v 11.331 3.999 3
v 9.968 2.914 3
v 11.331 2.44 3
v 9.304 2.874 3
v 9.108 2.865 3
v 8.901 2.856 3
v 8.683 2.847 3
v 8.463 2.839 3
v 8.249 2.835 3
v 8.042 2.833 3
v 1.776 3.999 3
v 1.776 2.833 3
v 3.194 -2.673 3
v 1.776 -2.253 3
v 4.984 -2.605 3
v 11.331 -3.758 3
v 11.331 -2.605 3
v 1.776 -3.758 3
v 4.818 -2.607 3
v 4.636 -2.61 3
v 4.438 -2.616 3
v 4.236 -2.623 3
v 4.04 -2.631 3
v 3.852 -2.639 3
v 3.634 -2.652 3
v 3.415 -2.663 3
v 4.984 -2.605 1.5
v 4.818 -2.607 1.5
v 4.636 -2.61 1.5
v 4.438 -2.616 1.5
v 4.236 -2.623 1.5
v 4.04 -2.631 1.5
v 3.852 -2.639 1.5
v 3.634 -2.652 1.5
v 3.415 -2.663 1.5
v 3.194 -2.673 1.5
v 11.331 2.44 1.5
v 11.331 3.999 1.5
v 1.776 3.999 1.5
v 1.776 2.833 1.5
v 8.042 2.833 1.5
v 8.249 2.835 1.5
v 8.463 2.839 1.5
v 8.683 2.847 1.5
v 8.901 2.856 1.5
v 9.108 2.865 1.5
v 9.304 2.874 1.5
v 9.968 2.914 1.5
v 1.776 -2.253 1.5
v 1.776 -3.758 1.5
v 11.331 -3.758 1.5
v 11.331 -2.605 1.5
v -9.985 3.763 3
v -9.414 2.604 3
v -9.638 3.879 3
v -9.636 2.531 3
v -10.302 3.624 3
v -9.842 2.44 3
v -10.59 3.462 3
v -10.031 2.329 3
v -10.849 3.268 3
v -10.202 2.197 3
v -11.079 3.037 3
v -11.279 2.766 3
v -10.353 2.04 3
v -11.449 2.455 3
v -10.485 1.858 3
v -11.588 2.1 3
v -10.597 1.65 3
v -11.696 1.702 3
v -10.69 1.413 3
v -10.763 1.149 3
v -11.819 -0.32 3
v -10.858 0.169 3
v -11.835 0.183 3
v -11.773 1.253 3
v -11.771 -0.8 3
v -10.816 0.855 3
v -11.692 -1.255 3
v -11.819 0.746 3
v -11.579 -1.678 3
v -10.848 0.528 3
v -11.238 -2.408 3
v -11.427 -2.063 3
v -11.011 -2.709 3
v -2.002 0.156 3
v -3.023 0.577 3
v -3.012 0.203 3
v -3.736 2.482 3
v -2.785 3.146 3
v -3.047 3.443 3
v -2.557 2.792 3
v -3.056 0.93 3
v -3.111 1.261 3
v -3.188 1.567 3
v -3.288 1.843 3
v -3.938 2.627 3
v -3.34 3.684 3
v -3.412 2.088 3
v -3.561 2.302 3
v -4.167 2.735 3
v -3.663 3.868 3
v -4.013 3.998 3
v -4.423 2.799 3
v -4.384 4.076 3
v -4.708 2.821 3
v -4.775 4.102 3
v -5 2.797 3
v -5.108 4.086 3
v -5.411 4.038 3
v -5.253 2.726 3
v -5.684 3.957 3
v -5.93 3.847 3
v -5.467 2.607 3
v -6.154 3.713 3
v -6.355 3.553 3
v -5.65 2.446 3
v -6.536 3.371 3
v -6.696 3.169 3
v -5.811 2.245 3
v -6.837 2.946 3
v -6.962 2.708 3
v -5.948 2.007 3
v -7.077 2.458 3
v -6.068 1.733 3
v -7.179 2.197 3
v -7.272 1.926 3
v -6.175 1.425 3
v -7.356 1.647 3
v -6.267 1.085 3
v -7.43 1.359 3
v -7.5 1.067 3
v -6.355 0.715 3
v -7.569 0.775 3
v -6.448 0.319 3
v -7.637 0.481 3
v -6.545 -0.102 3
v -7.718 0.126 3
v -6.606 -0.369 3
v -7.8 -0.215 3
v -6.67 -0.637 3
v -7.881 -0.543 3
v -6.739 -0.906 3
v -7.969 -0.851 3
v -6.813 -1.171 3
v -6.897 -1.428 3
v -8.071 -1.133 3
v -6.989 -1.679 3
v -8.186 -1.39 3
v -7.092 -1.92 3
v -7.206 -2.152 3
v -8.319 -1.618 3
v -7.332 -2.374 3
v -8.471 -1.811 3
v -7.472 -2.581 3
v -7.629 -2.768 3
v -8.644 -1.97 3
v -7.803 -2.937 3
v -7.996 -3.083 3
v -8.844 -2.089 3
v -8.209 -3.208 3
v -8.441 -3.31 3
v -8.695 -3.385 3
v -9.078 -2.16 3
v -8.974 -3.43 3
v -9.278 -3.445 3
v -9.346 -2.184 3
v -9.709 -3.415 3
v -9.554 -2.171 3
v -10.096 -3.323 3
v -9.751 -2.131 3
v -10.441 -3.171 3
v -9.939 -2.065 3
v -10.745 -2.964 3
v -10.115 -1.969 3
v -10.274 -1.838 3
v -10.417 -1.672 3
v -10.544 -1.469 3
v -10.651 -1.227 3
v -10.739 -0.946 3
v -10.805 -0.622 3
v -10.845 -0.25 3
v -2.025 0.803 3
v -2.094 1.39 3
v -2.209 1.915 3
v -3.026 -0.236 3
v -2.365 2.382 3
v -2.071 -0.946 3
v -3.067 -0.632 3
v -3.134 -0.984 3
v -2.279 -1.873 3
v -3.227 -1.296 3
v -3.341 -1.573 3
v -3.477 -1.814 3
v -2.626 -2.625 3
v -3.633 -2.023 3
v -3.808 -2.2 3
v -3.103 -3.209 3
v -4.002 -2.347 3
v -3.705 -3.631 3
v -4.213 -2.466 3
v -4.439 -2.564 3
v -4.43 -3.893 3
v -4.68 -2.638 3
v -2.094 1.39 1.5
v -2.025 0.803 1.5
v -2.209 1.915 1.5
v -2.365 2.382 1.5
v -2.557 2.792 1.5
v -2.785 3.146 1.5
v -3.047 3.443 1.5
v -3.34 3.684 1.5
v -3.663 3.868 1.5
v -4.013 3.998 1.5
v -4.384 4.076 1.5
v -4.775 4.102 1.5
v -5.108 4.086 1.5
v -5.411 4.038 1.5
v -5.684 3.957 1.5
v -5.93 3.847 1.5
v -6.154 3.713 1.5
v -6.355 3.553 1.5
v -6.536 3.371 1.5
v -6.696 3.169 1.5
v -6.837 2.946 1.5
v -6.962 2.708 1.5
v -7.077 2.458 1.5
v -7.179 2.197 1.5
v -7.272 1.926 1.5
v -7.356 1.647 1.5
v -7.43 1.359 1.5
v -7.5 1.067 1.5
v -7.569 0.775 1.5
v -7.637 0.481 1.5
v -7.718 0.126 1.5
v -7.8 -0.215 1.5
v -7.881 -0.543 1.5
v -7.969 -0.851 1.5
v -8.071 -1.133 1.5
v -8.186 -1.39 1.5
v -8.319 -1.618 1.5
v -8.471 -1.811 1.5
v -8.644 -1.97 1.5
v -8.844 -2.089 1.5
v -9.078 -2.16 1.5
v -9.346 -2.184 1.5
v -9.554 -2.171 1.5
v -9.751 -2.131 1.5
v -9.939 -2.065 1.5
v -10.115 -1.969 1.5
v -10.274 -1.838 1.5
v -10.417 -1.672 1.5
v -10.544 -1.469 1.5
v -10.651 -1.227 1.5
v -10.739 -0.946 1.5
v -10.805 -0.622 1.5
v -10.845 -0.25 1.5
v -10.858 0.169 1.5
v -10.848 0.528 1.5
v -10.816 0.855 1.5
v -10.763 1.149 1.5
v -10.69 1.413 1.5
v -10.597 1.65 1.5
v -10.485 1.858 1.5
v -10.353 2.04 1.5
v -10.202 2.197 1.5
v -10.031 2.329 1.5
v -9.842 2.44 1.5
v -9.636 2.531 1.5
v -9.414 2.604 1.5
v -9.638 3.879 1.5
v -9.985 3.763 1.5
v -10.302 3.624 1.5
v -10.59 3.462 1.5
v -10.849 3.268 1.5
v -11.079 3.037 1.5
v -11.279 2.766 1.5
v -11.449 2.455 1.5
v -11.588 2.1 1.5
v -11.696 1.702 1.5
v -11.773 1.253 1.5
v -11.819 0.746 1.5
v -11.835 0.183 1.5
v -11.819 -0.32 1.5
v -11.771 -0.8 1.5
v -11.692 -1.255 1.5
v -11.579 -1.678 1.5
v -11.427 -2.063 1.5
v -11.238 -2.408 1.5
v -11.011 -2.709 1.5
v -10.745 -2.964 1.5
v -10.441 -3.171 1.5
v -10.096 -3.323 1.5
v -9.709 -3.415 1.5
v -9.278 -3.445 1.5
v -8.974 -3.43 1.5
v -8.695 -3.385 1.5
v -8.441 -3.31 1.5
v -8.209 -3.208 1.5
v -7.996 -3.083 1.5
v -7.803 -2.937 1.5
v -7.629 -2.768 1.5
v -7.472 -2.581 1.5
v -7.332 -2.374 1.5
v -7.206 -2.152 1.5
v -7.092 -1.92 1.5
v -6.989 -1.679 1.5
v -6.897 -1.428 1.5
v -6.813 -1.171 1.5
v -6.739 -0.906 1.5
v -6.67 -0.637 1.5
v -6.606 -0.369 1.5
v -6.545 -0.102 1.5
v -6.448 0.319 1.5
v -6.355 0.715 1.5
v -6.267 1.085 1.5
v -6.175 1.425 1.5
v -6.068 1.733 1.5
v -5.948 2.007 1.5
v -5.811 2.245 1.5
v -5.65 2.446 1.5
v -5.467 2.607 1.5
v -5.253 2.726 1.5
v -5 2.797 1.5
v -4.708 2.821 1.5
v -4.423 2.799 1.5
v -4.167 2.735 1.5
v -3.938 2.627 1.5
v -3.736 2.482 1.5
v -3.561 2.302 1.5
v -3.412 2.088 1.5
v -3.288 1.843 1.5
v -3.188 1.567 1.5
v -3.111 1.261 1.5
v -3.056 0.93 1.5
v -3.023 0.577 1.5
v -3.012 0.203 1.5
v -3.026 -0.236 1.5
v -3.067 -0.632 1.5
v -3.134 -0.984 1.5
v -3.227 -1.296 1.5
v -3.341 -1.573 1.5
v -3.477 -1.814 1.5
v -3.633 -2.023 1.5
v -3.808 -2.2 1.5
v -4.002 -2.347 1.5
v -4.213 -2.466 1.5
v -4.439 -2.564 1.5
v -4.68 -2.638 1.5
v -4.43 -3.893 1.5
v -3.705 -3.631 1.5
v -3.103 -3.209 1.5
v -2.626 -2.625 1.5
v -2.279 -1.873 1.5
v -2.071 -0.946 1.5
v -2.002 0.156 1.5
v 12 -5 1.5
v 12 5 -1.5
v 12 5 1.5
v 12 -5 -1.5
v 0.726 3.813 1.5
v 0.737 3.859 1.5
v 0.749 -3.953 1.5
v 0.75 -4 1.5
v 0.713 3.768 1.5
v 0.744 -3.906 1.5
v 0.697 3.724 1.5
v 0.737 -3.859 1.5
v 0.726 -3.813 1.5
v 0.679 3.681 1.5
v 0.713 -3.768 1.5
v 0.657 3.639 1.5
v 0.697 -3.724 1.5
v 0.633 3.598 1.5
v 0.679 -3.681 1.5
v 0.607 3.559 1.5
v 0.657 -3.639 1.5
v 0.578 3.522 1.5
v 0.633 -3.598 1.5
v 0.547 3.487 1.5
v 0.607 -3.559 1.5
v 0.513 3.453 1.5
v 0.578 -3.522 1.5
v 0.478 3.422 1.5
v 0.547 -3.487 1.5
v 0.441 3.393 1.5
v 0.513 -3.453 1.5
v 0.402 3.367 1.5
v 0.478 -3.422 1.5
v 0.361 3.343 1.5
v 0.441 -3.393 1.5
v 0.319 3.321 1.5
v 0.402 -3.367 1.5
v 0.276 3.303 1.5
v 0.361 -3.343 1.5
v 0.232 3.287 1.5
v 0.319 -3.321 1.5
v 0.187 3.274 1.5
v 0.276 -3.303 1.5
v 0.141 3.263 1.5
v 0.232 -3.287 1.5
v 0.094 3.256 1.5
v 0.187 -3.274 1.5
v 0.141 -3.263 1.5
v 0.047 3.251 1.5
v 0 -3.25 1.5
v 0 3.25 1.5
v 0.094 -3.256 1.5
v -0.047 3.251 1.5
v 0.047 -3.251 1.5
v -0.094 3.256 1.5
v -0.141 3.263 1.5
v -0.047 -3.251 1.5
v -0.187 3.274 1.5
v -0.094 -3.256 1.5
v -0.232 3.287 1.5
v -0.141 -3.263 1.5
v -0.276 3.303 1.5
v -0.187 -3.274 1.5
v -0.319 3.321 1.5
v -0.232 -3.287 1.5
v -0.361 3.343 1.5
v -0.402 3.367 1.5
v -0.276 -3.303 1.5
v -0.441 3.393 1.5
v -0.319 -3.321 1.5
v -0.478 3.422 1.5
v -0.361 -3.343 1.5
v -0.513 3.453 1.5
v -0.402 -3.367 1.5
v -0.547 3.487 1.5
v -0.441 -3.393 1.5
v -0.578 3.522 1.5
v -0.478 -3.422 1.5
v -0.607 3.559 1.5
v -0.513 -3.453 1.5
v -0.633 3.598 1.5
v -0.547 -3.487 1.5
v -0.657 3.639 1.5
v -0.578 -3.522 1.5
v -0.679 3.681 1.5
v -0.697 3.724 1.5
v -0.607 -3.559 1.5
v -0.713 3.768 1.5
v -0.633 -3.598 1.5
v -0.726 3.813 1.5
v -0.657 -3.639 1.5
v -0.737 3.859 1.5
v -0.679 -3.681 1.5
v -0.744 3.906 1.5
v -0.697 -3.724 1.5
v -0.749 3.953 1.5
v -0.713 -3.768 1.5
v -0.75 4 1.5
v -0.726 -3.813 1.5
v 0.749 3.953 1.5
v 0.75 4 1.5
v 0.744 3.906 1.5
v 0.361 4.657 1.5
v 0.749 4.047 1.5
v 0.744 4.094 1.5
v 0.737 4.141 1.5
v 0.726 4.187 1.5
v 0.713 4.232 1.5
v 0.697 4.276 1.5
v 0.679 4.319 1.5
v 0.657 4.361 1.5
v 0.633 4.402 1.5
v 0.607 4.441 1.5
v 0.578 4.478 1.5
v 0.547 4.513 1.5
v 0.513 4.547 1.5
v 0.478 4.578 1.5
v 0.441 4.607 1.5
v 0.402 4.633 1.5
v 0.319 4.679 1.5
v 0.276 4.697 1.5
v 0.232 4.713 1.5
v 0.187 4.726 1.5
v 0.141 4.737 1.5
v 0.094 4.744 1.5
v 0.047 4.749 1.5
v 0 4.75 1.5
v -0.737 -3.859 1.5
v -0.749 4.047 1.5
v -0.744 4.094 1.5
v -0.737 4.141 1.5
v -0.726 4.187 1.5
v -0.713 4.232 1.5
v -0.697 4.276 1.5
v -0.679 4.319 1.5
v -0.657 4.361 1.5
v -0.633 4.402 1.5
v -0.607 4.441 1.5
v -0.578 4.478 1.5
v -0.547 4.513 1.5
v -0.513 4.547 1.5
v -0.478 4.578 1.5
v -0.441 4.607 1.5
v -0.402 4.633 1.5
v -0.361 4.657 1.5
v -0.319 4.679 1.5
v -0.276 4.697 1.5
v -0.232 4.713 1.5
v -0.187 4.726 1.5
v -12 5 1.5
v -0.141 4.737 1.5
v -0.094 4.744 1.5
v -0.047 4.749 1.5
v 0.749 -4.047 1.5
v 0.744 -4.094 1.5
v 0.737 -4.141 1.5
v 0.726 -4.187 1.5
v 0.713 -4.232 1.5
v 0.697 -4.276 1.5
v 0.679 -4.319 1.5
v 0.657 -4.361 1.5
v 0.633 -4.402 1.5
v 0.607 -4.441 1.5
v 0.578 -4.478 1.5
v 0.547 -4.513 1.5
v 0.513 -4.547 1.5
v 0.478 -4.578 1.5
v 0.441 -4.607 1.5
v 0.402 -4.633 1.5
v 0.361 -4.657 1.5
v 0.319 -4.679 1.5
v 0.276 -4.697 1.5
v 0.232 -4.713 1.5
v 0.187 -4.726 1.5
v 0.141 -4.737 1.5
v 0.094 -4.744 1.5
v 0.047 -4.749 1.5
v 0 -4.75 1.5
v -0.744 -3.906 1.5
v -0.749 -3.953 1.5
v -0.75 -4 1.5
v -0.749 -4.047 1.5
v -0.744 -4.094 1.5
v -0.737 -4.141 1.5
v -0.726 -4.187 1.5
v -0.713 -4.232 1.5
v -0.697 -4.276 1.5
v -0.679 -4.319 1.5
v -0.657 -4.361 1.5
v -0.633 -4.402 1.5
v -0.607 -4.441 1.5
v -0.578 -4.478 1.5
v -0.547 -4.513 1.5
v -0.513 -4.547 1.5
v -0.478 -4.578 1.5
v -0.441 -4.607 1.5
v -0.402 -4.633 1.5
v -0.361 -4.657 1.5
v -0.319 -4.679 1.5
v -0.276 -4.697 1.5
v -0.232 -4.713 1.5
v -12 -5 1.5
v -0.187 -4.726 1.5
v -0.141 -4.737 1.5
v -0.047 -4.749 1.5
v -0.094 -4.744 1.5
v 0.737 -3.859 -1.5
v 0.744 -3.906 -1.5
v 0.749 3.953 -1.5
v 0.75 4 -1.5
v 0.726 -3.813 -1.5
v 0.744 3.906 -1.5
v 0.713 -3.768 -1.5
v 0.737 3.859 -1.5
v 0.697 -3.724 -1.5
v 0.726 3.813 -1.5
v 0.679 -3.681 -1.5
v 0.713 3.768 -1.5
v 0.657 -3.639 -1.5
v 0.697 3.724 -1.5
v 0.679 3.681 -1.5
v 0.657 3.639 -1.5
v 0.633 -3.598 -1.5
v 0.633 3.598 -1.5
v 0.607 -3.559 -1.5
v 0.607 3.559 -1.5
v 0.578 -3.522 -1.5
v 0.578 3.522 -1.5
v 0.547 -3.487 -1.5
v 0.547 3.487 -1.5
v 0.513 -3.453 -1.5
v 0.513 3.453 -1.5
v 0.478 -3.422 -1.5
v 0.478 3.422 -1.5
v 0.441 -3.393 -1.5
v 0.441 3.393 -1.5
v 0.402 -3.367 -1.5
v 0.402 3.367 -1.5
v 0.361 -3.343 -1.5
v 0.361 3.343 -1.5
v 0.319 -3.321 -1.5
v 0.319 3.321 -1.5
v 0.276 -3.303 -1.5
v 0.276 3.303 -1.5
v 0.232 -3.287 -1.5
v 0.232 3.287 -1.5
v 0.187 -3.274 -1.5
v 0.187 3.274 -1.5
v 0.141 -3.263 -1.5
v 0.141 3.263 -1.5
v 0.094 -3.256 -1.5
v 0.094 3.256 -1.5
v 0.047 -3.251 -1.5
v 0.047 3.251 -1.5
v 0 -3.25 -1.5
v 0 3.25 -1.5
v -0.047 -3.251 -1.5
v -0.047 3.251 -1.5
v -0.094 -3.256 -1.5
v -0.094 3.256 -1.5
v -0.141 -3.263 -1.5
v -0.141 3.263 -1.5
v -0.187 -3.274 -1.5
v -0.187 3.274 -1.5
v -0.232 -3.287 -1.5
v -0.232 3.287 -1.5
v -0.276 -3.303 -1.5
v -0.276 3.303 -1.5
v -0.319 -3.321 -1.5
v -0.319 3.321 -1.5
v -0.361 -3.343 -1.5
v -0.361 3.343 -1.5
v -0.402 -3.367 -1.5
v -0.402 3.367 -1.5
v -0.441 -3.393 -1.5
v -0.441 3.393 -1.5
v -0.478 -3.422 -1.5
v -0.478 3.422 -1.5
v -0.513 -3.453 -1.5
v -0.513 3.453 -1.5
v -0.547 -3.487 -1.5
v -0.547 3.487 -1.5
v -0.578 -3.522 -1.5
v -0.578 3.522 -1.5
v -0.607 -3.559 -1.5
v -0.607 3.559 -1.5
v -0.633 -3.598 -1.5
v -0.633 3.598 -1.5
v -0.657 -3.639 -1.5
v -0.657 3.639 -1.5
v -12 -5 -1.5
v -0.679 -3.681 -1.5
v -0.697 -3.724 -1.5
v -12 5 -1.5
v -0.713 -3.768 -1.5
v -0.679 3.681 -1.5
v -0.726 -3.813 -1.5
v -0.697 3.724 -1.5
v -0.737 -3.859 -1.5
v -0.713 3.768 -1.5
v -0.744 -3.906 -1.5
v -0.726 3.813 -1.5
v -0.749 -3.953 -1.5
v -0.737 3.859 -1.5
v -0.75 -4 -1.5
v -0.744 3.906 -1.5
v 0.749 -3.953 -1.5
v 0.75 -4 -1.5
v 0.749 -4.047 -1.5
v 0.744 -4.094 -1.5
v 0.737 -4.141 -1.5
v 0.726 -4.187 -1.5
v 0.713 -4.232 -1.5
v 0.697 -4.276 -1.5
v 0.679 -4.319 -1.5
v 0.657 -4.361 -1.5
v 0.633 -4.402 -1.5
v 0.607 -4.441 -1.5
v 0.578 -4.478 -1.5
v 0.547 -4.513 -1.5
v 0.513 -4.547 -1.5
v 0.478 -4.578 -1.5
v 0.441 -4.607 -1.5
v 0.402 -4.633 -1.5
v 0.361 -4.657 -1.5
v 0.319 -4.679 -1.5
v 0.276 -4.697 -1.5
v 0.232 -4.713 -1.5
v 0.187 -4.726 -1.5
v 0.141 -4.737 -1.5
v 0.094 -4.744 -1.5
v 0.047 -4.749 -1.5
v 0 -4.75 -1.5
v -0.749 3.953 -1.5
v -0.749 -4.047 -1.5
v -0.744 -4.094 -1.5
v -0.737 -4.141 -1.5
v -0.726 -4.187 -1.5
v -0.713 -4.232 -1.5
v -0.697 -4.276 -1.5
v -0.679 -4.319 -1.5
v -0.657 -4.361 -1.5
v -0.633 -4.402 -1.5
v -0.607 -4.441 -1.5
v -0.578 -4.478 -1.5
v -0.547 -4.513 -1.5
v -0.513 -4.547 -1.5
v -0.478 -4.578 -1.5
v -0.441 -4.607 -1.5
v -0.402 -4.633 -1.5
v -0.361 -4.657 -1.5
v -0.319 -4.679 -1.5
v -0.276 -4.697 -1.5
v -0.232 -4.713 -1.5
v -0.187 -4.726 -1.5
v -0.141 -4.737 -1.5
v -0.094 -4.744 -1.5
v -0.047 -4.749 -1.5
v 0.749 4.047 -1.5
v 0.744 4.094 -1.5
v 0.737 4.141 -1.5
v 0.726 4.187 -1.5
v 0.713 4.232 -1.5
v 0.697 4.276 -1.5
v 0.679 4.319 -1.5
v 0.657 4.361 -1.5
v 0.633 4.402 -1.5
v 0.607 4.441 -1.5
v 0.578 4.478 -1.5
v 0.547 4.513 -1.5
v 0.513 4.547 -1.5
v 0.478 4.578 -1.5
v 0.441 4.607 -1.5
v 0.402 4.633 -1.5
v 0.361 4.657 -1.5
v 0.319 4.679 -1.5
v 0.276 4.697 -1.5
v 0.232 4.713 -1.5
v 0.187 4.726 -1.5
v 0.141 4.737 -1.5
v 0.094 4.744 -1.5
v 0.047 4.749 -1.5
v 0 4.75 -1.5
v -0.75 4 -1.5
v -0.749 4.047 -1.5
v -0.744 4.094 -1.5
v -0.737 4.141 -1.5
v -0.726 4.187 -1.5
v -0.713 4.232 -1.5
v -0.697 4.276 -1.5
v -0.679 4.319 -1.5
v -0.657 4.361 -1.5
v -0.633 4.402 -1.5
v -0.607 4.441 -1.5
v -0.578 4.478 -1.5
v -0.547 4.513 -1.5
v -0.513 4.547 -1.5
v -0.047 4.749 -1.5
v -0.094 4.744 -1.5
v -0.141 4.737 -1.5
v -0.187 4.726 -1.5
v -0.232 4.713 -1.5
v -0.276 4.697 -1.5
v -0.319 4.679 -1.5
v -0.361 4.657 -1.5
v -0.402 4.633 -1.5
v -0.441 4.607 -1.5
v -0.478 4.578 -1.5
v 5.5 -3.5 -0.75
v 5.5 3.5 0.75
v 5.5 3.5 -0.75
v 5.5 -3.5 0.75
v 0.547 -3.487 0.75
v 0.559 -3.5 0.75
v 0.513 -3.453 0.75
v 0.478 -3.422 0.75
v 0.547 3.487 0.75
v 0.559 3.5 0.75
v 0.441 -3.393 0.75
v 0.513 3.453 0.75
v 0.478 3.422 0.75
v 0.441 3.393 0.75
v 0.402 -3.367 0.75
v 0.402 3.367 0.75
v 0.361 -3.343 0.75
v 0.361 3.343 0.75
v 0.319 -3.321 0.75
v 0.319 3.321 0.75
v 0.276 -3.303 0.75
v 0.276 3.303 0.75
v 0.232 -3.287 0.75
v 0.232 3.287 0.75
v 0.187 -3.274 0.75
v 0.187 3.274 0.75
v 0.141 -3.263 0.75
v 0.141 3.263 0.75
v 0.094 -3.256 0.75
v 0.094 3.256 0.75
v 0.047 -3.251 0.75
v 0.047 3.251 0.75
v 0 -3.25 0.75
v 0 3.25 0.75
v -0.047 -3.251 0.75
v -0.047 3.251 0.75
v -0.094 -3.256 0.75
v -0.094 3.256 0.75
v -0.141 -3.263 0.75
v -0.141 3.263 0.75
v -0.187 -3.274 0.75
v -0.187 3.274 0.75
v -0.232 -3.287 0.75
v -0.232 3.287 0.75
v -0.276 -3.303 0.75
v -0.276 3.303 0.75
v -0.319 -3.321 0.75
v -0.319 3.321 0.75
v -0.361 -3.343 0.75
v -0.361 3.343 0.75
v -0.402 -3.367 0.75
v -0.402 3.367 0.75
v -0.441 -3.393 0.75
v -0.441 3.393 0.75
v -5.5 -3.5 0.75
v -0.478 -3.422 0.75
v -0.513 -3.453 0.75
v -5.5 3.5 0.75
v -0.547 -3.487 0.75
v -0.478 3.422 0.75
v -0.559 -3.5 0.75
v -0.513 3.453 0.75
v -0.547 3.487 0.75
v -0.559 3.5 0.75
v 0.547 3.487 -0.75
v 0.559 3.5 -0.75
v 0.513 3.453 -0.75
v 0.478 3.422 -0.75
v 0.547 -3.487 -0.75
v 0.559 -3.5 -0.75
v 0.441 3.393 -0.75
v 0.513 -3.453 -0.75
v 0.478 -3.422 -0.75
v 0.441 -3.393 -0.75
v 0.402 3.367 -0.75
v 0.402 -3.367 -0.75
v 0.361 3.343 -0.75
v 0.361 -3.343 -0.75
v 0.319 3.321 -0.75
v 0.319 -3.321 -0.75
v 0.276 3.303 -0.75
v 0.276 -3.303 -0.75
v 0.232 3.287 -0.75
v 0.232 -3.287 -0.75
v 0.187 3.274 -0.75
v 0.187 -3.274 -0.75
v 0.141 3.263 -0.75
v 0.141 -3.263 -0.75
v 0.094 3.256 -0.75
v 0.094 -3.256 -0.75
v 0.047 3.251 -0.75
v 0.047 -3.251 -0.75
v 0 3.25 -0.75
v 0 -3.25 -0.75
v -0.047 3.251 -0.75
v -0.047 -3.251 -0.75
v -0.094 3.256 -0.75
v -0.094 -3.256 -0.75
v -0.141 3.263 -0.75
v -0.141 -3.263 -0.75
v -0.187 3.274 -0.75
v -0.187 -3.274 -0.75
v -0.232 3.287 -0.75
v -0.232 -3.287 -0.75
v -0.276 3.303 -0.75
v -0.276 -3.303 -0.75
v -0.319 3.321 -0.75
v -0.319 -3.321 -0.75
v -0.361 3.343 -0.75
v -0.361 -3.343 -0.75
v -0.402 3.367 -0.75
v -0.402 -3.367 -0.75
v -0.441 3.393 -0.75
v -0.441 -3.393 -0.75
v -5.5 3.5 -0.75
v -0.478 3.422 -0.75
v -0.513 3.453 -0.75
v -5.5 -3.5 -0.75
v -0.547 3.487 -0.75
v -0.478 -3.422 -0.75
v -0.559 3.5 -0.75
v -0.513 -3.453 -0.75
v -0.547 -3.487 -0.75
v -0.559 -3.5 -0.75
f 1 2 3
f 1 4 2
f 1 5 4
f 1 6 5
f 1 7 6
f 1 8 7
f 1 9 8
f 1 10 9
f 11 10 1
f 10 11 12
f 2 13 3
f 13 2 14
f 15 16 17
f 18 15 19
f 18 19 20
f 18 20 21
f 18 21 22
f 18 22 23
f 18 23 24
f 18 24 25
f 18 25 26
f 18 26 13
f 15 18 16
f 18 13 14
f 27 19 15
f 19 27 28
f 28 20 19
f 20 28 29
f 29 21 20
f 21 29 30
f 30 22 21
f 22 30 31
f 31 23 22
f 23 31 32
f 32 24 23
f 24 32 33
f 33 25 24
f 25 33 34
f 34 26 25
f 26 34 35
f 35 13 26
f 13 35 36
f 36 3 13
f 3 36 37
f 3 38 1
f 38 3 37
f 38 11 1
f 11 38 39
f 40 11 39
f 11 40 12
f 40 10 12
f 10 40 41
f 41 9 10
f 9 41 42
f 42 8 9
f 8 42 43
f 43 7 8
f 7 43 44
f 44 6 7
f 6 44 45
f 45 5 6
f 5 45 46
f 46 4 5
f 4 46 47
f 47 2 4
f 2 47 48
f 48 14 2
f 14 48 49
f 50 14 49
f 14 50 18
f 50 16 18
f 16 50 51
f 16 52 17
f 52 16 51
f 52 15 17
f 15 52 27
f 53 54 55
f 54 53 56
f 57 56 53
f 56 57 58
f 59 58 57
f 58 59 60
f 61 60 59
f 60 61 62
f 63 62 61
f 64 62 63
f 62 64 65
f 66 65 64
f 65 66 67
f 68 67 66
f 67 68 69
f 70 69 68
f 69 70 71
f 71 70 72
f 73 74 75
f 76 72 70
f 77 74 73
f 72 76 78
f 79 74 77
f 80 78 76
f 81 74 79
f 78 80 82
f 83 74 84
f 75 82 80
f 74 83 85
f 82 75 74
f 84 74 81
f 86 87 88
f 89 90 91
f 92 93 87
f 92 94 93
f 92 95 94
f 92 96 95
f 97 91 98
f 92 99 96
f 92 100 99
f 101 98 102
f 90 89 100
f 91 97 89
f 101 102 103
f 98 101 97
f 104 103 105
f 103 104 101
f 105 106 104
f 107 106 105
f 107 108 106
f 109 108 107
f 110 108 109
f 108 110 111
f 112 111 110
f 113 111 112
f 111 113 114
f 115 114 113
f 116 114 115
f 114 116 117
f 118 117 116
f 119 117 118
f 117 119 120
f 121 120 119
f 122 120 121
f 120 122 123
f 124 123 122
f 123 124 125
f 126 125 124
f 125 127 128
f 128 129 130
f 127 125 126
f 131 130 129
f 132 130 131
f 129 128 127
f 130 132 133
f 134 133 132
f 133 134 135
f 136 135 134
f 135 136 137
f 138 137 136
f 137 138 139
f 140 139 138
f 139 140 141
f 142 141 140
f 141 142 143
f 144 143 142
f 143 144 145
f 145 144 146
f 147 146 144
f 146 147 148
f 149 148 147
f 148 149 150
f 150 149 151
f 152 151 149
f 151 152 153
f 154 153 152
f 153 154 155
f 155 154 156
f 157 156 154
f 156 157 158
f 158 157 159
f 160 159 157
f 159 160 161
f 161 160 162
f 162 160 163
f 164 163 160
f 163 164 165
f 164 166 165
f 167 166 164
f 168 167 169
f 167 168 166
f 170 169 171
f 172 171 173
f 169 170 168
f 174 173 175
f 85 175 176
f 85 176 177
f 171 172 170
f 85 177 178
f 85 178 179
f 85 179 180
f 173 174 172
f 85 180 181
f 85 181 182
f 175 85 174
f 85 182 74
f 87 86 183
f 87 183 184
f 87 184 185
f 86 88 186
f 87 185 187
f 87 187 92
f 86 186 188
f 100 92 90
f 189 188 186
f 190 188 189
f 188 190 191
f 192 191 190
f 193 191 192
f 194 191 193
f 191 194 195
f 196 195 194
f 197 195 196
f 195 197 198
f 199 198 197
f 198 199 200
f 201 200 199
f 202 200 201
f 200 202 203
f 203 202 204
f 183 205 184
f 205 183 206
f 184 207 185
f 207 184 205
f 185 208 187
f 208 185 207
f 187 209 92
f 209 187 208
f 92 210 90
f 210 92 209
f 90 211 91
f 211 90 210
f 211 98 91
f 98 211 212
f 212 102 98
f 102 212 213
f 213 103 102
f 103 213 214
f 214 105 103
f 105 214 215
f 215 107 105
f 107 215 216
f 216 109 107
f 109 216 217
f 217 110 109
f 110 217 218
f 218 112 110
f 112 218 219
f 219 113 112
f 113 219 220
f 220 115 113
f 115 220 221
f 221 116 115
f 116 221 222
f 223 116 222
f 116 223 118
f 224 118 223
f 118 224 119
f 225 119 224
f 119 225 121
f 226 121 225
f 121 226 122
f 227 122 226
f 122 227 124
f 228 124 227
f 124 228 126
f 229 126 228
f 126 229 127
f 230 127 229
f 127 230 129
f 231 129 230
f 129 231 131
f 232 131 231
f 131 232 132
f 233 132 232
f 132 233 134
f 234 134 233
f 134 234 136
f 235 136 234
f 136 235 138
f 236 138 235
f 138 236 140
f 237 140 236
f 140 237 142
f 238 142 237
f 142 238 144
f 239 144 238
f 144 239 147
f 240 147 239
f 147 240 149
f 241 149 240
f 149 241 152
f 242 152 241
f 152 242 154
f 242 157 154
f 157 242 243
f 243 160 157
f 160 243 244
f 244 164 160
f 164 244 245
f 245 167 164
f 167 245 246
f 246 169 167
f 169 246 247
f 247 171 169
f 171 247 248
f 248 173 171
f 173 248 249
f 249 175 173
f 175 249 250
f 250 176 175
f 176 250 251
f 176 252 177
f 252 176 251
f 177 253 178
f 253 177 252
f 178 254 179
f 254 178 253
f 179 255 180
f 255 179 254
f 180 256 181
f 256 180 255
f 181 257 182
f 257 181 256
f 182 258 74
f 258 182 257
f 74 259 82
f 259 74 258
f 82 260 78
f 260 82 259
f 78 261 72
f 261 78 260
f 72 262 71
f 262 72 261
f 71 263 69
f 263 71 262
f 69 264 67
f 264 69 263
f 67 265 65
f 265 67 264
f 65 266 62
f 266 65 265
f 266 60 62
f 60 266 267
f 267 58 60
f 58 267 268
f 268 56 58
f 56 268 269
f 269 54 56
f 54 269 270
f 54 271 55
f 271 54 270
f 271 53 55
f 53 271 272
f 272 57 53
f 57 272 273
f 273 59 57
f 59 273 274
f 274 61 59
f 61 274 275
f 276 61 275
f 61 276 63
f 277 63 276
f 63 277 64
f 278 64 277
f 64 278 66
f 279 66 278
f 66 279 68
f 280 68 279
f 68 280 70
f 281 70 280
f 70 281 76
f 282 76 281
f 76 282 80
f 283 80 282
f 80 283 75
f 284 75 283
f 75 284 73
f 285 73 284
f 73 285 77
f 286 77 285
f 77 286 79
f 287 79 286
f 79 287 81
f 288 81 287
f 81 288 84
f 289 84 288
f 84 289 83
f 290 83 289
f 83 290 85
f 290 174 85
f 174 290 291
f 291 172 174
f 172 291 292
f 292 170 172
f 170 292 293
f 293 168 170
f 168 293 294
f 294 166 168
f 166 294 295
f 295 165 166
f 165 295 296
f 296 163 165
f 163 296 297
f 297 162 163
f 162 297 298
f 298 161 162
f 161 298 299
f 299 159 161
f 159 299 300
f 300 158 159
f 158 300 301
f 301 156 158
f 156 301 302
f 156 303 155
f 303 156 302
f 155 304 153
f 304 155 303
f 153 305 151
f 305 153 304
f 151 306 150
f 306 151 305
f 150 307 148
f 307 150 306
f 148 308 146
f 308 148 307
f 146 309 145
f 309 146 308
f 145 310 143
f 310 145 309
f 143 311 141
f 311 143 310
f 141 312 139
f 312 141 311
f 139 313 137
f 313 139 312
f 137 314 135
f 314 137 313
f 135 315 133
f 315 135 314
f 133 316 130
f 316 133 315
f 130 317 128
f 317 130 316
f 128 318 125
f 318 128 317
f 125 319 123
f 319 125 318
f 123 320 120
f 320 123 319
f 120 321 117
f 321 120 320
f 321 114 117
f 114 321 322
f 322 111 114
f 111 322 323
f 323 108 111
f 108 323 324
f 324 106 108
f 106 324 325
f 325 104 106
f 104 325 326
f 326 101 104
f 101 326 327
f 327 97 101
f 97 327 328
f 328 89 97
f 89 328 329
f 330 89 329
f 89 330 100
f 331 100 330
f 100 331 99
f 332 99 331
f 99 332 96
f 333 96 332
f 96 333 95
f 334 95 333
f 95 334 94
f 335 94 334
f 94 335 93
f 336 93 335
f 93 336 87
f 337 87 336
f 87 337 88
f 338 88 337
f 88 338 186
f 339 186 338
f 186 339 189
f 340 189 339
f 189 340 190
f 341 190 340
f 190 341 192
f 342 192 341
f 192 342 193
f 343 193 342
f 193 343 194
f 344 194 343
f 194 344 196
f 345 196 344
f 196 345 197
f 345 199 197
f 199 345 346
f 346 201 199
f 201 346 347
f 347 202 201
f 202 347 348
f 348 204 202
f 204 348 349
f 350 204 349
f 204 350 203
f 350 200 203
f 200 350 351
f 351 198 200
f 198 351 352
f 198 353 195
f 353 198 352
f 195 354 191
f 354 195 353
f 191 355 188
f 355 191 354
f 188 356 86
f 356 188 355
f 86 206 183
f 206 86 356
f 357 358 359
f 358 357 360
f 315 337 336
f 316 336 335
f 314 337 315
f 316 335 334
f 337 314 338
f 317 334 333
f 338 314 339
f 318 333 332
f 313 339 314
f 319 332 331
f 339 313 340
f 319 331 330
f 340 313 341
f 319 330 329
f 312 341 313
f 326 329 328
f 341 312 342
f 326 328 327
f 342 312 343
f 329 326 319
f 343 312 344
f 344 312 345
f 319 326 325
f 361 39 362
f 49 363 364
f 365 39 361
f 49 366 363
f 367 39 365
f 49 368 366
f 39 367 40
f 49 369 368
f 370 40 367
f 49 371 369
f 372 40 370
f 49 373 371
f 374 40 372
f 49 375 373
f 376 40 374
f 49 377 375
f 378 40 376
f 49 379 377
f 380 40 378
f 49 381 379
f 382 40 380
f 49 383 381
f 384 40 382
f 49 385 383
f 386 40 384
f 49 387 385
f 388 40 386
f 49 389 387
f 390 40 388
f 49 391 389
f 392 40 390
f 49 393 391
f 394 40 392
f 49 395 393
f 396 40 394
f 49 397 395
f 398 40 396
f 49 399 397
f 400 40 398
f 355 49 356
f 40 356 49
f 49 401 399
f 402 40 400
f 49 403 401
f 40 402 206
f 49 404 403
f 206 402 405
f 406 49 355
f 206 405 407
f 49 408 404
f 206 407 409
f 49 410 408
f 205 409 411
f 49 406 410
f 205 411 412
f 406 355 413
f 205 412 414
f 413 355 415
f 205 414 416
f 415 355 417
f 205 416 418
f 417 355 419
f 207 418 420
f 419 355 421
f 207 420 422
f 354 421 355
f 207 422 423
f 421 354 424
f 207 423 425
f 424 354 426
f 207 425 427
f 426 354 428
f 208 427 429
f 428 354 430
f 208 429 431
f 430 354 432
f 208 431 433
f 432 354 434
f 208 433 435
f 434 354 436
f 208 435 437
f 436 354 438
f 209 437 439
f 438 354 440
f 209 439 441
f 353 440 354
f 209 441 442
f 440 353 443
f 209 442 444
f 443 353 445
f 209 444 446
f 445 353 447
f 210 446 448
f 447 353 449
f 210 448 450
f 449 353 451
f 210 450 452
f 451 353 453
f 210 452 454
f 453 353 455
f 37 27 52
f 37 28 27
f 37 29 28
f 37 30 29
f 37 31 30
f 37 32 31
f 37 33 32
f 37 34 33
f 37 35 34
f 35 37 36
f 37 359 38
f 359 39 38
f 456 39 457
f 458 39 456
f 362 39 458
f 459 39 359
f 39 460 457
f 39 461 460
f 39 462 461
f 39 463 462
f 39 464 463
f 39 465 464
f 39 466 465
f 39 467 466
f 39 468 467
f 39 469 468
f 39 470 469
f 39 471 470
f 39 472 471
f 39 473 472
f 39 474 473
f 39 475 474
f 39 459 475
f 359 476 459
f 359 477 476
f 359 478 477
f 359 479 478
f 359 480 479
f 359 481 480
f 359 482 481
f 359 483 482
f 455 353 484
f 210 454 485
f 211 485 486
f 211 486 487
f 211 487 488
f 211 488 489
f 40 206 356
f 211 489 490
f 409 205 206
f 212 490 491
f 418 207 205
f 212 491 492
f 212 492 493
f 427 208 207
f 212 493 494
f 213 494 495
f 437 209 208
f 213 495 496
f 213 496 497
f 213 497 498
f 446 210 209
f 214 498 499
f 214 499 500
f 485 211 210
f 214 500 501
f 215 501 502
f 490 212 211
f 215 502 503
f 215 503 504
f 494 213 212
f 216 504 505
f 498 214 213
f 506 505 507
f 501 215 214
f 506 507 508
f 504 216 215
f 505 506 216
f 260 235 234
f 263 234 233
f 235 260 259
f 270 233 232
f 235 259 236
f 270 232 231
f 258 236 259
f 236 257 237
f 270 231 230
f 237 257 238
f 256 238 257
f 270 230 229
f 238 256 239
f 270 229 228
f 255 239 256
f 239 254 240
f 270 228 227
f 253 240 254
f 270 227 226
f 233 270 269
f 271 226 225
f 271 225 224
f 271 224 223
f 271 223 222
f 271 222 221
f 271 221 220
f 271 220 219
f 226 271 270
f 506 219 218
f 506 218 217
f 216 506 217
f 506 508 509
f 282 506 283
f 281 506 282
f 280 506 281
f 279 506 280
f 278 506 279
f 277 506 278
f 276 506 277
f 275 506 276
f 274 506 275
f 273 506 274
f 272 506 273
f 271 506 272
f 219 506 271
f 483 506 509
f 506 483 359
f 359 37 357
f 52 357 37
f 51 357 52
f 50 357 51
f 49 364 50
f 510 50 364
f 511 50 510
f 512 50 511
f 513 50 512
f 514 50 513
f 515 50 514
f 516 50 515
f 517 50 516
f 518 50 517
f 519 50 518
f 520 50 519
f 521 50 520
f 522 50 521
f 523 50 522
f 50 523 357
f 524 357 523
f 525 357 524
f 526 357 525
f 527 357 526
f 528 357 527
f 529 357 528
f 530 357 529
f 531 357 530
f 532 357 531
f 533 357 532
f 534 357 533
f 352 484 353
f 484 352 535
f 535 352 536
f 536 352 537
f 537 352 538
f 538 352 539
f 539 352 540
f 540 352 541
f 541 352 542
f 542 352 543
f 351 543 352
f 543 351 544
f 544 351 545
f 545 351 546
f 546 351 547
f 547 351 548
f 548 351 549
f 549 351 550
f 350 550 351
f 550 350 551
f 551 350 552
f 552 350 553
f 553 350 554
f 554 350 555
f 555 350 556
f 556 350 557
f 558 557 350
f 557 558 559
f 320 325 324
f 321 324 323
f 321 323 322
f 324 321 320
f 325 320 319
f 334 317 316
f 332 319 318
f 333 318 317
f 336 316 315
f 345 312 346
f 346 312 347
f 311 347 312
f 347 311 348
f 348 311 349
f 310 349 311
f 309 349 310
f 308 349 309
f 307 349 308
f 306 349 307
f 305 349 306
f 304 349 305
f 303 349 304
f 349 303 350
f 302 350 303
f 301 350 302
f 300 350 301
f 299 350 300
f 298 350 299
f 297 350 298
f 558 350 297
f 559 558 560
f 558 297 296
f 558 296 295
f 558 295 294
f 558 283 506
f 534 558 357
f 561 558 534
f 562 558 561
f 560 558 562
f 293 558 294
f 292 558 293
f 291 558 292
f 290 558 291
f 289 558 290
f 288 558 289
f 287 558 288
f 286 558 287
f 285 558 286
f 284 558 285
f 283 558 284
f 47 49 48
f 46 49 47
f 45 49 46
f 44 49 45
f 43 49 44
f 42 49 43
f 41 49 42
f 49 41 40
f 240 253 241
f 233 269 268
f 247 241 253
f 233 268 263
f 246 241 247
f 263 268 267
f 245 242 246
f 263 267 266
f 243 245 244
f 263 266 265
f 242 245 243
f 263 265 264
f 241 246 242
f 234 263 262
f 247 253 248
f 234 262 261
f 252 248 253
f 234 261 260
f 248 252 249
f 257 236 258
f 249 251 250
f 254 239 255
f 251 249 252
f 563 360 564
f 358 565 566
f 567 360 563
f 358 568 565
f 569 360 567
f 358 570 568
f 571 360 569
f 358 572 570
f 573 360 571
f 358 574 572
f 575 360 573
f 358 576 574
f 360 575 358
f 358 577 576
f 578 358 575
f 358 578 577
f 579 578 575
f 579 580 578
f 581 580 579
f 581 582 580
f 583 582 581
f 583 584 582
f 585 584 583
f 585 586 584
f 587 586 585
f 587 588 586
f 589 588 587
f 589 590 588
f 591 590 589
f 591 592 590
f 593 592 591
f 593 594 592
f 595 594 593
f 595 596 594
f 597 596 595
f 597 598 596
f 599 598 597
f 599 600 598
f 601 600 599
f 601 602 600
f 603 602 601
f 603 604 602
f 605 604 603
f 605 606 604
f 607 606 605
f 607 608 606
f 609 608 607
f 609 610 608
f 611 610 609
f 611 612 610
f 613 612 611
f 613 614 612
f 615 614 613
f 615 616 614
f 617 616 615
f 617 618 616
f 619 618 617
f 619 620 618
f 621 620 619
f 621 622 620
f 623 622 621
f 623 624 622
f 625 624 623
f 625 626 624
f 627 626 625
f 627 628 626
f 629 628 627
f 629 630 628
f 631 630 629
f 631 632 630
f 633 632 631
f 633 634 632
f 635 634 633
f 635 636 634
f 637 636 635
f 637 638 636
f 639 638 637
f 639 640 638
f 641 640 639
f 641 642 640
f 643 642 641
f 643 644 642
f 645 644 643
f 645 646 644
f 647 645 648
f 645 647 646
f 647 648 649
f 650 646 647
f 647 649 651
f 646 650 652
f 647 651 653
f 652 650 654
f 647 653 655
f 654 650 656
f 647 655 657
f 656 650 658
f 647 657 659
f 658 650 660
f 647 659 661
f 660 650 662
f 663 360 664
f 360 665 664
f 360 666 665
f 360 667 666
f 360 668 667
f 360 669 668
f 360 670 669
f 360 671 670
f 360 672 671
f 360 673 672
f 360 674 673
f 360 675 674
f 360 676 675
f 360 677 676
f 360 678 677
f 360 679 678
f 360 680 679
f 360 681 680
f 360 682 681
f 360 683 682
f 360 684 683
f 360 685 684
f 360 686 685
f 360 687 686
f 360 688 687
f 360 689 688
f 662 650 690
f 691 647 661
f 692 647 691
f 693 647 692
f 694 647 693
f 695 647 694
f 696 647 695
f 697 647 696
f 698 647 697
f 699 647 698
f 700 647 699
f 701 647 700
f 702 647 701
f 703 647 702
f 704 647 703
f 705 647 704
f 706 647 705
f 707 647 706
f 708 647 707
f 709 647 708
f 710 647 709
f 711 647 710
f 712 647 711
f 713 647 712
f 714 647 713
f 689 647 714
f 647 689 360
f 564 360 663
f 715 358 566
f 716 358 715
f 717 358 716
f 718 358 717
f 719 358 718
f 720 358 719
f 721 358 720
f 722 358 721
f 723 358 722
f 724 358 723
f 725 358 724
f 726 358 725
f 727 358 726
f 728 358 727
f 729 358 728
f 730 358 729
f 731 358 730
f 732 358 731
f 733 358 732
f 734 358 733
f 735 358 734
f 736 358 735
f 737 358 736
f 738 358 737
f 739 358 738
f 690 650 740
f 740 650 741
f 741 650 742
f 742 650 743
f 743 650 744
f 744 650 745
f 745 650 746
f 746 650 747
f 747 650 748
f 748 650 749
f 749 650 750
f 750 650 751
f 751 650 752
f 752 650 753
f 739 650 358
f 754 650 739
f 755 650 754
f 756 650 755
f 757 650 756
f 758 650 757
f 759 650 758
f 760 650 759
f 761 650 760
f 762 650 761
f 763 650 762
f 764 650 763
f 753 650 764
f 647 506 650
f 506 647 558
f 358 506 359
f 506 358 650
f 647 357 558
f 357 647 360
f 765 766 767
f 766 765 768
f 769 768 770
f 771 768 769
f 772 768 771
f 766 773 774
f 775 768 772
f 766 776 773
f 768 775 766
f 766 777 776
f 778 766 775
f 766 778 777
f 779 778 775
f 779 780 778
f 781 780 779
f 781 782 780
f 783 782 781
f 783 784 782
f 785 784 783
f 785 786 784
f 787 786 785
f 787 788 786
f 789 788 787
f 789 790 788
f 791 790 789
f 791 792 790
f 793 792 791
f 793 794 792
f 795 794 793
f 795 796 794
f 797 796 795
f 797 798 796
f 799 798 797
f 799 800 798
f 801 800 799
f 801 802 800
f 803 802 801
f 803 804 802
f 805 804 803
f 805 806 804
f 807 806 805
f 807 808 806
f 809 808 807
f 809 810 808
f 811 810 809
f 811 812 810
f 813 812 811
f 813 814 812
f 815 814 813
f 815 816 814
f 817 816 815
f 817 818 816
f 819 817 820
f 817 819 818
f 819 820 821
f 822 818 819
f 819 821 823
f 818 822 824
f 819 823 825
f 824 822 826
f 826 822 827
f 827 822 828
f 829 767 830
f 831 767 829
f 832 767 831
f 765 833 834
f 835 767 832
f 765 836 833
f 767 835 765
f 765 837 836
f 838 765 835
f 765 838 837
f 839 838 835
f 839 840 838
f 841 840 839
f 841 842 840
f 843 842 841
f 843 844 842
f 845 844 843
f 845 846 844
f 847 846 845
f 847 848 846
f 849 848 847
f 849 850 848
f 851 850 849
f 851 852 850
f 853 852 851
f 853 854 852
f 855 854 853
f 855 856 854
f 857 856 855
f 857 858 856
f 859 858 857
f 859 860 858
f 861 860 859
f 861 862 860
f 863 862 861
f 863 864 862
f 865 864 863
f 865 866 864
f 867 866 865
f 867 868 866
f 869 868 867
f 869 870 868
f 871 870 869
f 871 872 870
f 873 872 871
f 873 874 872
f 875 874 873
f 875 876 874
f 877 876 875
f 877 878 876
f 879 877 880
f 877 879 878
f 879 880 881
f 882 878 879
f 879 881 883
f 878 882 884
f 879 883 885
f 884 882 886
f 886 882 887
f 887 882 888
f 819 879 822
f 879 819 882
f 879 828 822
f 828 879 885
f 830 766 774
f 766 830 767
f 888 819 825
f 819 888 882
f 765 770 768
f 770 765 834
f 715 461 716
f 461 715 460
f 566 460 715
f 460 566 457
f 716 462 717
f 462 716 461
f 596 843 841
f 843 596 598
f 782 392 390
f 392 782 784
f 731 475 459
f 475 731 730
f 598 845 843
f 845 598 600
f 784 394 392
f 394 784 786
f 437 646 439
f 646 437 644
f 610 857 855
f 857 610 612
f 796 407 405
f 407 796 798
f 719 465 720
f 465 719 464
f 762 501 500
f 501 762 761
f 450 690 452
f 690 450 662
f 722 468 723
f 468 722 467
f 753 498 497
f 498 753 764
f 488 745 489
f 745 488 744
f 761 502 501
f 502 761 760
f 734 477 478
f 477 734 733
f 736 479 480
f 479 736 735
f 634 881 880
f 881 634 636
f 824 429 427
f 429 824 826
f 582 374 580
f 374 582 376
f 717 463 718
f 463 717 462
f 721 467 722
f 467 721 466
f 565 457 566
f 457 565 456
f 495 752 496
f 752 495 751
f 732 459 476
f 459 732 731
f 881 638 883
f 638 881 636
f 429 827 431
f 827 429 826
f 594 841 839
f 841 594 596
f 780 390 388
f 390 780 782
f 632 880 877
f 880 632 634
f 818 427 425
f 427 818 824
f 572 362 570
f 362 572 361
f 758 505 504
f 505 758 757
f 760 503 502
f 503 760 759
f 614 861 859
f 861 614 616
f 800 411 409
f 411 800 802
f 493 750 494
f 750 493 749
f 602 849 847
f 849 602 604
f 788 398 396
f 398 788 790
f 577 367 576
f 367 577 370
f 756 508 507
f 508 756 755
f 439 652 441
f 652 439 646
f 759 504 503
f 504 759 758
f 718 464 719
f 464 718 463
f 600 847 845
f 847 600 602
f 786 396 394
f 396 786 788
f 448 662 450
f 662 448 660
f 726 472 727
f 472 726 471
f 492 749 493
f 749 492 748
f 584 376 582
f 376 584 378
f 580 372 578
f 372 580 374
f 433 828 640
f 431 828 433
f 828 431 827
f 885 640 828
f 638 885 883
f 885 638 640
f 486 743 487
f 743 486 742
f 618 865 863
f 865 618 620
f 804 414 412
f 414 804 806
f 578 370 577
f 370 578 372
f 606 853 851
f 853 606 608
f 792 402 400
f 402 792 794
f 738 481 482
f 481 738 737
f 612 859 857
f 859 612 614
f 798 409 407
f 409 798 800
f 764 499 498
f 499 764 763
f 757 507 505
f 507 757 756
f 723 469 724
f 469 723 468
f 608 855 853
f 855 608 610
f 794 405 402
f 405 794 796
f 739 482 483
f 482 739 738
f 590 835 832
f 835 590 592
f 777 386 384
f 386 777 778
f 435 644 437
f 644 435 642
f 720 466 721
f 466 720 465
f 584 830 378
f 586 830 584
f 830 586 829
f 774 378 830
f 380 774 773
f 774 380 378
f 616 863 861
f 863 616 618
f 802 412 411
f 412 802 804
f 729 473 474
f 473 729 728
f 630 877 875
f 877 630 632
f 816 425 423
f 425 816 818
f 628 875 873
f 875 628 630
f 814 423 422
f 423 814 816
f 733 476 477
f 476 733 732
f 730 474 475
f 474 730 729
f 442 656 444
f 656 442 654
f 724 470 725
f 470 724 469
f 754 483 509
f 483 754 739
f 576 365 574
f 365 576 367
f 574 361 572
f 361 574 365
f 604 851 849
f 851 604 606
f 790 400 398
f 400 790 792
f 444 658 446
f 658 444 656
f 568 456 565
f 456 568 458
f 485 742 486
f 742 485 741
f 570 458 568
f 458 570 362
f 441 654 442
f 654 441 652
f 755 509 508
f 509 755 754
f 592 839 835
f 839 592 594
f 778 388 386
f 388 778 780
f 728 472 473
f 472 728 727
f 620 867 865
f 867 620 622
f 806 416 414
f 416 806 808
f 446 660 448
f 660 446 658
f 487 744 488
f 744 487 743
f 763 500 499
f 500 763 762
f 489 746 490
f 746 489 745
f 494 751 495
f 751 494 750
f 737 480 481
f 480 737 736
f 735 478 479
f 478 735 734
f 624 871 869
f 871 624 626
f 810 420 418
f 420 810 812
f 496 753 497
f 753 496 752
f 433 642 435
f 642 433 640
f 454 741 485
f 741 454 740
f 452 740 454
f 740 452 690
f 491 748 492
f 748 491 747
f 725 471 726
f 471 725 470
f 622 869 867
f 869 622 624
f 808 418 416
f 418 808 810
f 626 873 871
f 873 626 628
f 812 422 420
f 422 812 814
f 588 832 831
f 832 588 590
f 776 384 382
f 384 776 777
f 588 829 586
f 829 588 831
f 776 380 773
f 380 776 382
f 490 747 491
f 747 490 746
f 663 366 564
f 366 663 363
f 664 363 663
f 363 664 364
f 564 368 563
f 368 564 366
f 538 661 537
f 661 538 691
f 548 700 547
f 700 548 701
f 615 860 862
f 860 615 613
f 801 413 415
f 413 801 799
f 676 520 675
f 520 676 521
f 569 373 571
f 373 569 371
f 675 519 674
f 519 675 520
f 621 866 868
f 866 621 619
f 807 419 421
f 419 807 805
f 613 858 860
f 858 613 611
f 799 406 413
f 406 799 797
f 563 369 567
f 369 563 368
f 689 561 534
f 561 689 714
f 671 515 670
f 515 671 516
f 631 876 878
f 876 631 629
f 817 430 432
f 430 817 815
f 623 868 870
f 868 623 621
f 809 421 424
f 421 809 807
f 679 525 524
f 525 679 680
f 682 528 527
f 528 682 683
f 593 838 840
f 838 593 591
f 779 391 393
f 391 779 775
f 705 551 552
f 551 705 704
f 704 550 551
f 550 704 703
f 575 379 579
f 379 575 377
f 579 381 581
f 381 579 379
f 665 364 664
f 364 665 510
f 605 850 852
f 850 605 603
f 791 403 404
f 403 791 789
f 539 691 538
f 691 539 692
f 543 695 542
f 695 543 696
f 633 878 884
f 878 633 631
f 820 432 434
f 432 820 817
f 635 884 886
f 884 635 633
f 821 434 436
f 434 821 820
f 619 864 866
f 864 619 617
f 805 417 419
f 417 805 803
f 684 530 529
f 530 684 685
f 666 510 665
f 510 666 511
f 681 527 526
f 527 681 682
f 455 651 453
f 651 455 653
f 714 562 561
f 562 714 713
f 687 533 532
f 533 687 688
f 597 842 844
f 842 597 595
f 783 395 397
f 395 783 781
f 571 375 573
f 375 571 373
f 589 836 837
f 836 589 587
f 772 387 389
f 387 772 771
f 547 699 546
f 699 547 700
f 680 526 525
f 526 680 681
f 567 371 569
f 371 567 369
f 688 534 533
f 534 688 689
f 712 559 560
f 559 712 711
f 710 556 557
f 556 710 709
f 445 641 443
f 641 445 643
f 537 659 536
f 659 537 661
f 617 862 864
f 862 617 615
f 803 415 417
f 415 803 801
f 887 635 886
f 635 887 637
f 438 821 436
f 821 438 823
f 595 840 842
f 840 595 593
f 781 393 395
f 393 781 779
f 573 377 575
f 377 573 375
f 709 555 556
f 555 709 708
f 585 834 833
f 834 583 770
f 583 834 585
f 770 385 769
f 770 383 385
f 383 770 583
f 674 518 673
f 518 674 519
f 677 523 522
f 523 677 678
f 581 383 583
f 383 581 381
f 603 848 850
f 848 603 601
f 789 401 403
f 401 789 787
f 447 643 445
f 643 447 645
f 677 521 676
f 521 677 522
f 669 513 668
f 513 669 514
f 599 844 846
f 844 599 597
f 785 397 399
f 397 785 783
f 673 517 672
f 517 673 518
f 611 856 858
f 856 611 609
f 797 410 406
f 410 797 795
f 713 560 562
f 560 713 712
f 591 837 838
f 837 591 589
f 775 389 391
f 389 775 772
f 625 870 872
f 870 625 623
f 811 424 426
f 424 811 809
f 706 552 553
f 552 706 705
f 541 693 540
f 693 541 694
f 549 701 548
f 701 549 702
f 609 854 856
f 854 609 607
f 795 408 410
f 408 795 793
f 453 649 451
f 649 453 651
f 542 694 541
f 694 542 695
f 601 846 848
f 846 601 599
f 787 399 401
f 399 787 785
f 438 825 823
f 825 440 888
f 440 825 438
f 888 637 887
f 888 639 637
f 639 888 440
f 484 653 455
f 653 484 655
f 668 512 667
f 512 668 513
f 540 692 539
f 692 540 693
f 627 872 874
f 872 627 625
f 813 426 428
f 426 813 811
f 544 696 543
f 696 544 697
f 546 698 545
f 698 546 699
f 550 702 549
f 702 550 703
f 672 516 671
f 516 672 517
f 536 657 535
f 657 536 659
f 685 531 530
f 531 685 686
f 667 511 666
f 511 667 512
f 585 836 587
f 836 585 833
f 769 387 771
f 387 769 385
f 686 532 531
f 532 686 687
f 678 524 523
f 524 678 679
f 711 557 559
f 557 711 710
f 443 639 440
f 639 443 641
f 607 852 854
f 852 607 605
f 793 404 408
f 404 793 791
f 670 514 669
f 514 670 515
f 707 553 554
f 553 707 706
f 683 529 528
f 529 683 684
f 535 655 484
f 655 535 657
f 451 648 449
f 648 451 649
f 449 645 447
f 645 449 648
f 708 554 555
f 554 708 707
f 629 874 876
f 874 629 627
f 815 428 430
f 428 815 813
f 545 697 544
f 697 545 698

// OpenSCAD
difference()
{
    union()
    {
        translate([2,0,0]) linear_extrude(height = 3) rotate([0,0,90])
            text("N", size = 10, h =10, $fn = 16, halign="center", valign="top");
        translate([-2,0,0]) linear_extrude(height = 3) rotate([0,0,90])
            text("S", size = 10, h =10, $fn = 16, halign="center", valign="bottom");
        cube([24,10,3], center=true);
    }
    cube([11,7,1.5], center=true); 
    
    translate([0,4,0])
        cylinder(r=1.5/2, h=100, center=true, $fn=100);
    translate([0,-4,0])
        cylinder(r=1.5/2, h=100, center=true, $fn=100);
}
